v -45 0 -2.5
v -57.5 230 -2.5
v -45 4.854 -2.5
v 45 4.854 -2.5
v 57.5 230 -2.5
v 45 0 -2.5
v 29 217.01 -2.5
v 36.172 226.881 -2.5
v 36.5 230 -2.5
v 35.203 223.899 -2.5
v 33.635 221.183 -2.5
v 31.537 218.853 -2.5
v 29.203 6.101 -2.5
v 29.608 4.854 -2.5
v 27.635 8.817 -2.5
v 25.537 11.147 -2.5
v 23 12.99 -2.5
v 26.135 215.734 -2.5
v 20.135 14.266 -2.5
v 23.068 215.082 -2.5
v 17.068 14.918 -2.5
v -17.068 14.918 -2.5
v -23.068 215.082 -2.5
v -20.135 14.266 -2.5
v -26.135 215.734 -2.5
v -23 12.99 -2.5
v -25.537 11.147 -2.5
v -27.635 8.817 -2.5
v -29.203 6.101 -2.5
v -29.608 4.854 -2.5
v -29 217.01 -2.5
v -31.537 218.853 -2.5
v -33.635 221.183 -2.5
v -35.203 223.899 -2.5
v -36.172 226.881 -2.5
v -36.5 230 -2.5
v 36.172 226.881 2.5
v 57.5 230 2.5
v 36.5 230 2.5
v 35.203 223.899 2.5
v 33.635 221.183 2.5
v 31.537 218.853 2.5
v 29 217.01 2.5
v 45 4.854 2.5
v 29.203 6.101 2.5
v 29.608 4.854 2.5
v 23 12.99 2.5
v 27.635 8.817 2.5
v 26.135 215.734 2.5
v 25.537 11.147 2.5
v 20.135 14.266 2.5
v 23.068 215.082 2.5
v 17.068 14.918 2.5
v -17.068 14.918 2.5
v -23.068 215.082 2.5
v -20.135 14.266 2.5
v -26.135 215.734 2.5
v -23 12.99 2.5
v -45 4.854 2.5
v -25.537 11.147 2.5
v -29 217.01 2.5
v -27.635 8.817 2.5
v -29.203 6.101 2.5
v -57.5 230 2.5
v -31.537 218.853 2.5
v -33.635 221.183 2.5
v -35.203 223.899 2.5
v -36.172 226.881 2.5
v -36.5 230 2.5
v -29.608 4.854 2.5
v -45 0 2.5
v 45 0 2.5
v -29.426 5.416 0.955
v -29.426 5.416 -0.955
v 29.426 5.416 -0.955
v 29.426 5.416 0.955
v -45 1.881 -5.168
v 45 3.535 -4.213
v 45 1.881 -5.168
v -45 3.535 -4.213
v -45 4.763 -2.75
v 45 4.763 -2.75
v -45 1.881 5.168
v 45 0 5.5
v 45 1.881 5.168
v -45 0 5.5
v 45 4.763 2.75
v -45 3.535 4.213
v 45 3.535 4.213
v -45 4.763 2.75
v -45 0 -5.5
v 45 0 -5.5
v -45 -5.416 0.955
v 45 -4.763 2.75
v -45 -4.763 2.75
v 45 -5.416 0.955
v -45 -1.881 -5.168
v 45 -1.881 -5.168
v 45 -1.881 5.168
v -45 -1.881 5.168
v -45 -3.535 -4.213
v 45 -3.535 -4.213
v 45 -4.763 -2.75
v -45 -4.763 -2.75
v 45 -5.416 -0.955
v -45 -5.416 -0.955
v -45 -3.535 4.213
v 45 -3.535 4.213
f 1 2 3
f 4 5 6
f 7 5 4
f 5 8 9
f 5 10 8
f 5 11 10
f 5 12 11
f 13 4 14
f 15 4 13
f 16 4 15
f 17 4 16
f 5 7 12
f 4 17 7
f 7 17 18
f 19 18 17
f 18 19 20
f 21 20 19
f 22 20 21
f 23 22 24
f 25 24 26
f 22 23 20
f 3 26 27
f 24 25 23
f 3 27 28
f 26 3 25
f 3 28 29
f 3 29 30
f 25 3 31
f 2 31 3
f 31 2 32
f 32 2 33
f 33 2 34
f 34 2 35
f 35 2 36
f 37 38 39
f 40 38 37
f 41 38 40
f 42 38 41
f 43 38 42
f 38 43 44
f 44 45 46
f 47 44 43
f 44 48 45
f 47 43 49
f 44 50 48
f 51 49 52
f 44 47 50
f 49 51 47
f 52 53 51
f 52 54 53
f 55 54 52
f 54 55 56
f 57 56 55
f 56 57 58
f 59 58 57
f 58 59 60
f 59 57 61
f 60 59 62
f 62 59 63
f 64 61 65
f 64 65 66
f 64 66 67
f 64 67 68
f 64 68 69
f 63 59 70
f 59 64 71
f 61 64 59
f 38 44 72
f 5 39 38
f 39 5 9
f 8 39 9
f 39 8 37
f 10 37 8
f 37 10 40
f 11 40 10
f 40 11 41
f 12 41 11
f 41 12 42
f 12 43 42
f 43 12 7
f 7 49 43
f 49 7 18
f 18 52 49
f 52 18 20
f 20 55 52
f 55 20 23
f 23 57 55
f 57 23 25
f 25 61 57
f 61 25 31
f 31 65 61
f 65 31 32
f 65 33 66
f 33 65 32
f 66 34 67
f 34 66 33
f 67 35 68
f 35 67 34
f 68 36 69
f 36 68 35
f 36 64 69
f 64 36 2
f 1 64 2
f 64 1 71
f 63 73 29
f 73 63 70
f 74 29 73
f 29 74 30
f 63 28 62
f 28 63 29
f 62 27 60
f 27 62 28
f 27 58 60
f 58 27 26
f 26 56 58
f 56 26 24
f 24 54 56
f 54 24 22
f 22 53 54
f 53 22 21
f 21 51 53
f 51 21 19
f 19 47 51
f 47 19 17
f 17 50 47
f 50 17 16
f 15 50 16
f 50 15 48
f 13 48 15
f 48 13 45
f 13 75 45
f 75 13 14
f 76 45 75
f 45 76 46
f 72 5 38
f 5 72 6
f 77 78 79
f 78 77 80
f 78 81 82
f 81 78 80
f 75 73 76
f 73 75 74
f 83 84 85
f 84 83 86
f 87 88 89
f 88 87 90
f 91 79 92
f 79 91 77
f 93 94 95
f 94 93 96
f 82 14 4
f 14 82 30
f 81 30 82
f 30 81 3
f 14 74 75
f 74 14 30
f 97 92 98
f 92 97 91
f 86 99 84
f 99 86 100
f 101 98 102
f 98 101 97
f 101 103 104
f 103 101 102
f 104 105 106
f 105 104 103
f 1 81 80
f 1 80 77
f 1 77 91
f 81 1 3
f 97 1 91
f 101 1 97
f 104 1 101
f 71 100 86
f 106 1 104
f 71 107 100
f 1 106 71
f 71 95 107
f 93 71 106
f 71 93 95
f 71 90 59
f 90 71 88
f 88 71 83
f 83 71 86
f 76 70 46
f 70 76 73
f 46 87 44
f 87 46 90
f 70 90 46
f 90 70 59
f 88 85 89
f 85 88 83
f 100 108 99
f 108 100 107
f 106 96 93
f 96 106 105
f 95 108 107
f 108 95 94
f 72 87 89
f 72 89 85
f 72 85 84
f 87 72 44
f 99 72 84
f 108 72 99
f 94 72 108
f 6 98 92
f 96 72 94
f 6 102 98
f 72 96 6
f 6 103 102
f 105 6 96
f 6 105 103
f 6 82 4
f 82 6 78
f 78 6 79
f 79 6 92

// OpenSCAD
/*
A `sign` consists of two `side`s, each symmetrical about the `y` axis and therefore represented as `half` a `side` 

The `half` is mirrored and printed, creating one `side` of a `sign`.

At the top is the `handle`, below which is the `handle_opening`. At the base there is a `void` between the feet. The `handle_width` is less than the `foot_width`.

The edges of the `side`s, `handle_opening`, and `void` between the feet have a small raised `welt` for stiffness and esthetics.

Collectively, anything that makes a hole in the `side` are `holes`, which are a `union()` so they can be `difference()`'ed from the `side`.
*/

s = 5;
handle_width = 18 * s;
height = 46 * s;
foot_width = 23 * s;

linear_extrude(height = s, center = true) difference() {
    blank();
    holes();
}

rotate([0, 90, 0]) cylinder(h = handle_width, r = s * 1.1, center = true);

module blank() {
    for (n = [1, -1]) {
        polygon([
            [0, 0],
            [n * handle_width / 2, 0],
            [n * foot_width / 2, height],
            [0, height],
        ]);
    }
}

module holes() difference() {
    union() {
        hull() for (n = [1, -1]) {
            translate([n * s * 3.1, 0, 0]) circle(s * 3);
        }
        hull() for (n = [1, -1]) {
            translate([n * s * 4.3, height, 0]) circle(s * 3);
        }
    }
}
